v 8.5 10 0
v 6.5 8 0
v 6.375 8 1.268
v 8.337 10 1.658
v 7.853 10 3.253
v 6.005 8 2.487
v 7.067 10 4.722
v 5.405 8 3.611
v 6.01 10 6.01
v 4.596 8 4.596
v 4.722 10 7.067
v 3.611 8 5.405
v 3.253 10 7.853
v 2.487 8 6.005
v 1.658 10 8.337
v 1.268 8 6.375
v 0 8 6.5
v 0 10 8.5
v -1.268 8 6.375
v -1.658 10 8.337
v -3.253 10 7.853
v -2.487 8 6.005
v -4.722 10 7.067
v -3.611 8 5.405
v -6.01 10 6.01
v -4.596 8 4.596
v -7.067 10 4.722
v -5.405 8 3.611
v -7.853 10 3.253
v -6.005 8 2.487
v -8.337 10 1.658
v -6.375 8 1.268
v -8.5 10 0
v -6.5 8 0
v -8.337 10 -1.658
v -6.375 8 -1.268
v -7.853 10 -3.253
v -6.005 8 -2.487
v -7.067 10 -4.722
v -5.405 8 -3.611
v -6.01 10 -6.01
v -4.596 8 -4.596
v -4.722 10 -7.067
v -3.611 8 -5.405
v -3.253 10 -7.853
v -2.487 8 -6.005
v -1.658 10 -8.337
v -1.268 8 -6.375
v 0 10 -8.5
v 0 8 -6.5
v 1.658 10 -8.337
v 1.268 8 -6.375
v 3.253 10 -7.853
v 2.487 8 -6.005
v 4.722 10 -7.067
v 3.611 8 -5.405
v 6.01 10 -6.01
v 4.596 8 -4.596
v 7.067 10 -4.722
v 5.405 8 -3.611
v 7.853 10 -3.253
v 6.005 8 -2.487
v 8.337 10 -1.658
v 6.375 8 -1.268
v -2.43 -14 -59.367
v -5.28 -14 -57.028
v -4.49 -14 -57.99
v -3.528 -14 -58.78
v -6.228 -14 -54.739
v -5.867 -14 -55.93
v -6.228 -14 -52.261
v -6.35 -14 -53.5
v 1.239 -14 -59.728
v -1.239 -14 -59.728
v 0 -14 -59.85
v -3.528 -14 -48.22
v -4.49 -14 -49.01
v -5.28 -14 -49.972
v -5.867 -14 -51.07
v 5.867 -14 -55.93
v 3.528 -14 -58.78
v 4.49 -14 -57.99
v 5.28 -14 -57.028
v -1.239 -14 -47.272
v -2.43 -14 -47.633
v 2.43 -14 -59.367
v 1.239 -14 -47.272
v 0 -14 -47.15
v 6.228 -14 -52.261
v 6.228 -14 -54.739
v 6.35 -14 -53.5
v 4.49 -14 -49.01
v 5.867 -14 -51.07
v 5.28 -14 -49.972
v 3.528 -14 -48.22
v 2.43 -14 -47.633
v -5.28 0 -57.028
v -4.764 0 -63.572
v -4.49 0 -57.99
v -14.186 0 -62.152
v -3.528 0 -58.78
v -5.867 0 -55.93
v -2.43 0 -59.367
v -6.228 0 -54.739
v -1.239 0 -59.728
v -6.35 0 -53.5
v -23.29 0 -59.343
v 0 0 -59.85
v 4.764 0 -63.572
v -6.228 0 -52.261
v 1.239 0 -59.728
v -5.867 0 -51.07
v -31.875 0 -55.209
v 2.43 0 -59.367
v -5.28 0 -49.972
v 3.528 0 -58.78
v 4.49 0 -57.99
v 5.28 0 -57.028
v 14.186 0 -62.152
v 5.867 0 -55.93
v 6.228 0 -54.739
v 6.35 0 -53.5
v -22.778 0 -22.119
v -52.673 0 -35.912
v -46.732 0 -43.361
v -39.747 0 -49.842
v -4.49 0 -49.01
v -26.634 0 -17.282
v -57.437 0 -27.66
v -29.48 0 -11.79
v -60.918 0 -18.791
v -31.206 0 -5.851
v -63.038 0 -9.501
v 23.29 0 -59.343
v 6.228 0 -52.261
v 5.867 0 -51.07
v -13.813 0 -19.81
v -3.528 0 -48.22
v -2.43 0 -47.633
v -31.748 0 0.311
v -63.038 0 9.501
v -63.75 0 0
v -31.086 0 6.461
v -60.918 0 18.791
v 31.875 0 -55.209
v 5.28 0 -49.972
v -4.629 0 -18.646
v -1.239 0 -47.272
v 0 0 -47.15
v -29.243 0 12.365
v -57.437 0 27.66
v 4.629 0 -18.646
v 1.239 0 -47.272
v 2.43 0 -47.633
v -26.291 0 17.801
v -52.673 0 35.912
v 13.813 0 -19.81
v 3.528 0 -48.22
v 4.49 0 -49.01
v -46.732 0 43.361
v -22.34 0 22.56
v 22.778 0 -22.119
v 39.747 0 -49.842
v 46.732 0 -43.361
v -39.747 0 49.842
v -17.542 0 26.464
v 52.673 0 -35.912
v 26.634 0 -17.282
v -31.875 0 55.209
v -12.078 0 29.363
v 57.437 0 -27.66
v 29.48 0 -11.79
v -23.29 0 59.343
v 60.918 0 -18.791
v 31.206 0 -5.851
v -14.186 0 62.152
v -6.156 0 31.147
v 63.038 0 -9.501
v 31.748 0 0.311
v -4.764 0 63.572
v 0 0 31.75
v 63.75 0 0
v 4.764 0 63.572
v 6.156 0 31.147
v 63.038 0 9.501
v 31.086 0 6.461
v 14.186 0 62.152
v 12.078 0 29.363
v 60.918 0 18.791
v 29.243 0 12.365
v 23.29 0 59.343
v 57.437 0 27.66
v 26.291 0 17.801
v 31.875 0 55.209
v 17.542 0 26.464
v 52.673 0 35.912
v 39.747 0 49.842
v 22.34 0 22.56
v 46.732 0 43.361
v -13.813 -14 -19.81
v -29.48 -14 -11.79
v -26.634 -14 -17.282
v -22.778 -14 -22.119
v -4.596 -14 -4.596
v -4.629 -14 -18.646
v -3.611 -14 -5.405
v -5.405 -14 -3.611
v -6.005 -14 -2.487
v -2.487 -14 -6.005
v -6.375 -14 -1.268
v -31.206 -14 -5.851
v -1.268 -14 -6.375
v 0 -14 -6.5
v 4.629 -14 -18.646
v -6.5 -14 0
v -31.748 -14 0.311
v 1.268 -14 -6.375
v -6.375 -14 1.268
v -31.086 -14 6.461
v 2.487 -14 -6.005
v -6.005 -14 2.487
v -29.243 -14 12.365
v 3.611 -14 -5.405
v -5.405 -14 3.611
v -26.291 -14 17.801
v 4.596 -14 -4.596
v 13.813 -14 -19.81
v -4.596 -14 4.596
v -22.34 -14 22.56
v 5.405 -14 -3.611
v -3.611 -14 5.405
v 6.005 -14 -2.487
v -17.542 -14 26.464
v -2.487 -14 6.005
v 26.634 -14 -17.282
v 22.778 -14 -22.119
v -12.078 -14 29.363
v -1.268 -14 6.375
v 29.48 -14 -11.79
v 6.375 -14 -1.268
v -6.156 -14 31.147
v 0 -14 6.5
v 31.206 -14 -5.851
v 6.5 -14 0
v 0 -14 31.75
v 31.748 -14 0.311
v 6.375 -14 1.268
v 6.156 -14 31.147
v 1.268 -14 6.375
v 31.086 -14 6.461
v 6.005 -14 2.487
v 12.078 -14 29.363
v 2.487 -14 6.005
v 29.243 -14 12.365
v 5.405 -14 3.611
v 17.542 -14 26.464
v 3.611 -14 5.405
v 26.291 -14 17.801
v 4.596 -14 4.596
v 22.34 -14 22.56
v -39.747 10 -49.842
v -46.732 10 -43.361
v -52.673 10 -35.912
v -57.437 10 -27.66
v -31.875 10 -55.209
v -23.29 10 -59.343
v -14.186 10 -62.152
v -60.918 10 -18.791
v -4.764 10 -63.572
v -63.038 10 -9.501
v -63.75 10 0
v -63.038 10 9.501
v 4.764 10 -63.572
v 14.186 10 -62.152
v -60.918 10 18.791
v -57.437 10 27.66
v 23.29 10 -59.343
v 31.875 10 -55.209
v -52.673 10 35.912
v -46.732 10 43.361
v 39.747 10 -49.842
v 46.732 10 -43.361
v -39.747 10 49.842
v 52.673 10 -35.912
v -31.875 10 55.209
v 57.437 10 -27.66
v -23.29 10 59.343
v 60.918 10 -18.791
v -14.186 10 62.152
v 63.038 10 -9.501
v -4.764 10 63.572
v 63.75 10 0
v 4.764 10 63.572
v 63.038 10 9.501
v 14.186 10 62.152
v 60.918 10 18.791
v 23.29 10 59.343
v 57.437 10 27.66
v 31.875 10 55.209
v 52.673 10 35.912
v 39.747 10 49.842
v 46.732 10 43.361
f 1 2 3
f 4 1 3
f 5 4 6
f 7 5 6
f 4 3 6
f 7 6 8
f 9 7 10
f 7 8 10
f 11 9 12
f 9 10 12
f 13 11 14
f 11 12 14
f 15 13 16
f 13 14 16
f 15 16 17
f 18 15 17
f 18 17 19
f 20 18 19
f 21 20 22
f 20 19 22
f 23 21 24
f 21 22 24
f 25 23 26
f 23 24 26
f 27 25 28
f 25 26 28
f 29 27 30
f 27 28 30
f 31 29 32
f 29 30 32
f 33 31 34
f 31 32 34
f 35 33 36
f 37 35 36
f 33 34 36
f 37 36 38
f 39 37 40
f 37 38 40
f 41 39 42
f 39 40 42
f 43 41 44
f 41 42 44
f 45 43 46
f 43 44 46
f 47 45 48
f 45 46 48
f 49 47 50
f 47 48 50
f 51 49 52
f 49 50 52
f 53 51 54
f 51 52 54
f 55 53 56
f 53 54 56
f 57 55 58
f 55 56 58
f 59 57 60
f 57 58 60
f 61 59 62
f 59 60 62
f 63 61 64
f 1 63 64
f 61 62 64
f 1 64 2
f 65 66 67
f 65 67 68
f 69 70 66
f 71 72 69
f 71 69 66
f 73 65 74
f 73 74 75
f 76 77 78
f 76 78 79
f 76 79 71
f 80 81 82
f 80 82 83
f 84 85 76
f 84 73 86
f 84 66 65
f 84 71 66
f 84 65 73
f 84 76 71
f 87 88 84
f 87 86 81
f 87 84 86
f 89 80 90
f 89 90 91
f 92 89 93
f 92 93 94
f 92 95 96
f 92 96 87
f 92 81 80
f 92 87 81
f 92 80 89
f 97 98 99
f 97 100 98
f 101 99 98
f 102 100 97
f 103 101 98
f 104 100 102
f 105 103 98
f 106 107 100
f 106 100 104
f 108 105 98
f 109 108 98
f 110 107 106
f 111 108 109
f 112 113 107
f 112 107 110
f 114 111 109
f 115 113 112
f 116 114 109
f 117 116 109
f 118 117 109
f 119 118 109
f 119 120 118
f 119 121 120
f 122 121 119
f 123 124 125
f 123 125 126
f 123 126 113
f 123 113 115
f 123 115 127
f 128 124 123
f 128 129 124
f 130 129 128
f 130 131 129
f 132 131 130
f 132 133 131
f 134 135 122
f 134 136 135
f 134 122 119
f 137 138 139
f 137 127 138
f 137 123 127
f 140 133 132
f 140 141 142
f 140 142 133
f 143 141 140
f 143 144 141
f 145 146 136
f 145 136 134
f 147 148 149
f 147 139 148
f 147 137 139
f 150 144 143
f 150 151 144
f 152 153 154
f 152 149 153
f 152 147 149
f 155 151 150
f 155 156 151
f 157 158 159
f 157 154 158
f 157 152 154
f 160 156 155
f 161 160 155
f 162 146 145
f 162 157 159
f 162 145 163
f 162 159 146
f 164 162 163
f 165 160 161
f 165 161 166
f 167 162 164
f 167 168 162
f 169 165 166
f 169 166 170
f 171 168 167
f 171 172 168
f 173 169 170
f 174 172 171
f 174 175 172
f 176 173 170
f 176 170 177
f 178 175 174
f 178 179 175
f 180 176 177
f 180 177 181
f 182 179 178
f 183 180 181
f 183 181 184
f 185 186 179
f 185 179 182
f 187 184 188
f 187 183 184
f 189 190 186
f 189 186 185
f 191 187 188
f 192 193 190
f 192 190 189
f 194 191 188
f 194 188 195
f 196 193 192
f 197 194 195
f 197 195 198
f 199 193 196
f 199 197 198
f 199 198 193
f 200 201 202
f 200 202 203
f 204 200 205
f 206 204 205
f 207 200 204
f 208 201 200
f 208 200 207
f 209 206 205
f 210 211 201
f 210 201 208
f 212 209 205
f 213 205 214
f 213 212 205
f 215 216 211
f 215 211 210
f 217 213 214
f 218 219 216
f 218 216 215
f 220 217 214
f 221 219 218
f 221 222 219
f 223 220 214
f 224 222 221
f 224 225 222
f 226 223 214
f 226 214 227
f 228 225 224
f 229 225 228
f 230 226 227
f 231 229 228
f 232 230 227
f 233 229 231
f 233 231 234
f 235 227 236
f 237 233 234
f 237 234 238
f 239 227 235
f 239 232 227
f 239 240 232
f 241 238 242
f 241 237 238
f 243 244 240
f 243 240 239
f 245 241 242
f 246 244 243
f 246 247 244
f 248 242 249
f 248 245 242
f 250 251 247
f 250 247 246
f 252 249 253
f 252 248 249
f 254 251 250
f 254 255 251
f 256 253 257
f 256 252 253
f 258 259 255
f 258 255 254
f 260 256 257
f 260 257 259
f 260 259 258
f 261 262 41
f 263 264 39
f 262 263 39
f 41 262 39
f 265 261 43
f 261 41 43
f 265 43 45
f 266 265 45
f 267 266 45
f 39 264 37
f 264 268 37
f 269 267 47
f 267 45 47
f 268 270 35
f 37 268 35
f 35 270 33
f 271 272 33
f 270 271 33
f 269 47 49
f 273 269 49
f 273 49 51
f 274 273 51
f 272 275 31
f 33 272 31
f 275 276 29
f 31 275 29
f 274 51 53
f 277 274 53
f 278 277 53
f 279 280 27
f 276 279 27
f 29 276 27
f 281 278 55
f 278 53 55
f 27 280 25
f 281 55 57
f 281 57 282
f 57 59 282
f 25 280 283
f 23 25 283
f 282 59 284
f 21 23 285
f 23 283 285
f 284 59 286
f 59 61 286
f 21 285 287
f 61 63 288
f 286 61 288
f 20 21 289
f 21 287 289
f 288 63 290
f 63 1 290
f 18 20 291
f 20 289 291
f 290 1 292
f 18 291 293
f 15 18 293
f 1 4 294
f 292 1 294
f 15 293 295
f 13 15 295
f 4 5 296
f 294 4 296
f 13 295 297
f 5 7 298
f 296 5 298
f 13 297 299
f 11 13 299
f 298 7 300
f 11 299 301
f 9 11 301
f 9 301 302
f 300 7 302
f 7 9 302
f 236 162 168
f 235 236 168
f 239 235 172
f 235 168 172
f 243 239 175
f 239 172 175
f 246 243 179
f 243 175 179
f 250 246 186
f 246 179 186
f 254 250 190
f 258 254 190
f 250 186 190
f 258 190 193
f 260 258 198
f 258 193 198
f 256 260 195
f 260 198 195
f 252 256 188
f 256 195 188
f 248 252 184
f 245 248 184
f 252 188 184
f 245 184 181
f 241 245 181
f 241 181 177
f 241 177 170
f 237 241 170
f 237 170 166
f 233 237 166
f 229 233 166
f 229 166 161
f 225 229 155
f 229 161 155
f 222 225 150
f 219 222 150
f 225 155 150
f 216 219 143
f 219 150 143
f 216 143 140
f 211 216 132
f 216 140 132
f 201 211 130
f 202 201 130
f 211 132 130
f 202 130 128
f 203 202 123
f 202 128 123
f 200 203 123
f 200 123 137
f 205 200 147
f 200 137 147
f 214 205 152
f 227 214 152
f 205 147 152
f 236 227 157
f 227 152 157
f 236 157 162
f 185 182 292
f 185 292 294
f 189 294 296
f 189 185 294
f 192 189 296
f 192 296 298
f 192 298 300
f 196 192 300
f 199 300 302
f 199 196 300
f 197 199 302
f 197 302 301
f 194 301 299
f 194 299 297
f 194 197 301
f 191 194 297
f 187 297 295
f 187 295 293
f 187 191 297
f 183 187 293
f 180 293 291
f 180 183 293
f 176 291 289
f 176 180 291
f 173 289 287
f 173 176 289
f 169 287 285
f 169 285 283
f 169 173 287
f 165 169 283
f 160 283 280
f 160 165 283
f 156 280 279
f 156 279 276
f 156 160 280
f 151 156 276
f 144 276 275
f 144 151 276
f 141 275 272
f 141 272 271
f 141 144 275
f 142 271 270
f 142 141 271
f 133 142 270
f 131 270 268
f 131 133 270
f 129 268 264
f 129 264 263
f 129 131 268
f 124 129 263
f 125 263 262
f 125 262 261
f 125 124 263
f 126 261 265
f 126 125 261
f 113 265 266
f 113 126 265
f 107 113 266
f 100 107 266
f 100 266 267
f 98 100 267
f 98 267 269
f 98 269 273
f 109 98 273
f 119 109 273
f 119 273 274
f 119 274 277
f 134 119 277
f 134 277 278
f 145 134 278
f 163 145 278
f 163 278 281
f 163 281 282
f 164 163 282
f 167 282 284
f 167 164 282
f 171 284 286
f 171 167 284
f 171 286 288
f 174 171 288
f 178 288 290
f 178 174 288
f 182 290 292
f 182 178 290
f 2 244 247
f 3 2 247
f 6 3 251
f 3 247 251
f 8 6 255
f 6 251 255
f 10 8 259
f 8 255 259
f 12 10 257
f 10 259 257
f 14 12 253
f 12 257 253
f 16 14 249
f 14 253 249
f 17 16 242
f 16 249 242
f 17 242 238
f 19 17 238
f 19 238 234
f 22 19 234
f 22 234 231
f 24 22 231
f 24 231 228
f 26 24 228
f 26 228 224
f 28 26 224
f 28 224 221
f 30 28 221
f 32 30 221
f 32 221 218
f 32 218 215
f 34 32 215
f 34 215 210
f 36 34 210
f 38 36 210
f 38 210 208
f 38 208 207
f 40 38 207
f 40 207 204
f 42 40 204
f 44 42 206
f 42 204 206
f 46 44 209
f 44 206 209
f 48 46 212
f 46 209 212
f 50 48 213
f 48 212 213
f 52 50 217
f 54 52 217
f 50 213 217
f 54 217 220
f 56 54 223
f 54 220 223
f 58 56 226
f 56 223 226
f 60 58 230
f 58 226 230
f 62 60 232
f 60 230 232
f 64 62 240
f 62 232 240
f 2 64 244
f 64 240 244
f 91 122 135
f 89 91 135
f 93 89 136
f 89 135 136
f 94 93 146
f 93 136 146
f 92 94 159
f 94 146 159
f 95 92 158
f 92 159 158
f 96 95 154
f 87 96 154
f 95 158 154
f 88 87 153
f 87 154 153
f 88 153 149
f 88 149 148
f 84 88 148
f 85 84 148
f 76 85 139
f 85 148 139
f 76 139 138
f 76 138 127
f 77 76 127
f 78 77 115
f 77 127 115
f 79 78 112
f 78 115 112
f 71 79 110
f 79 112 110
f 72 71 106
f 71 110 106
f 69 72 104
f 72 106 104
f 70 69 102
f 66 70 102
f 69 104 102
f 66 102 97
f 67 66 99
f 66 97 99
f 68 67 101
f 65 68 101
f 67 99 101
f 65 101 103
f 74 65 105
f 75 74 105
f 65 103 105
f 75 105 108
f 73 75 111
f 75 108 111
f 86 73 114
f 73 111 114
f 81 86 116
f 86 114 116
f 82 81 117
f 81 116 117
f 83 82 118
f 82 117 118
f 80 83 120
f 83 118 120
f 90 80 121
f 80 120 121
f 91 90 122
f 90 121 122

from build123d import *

# Parameters (mm, degrees)
F1_R          = 63.75
F2_DEPTH      = 10
F3_R          = 6.35
F4_DEPTH      = 14
F5_R          = 6.5
F6_DEPTH      = 10.001
F6_DEPTH_BACK = 14.001
F7_SIZE       = 2


with BuildPart() as f2:
    # F1 (on Front) → F2 (new body)
    with BuildSketch(Plane.XZ):
        Circle(F1_R)
    extrude(amount=-F2_DEPTH)

    # F3 (on Front) → F4 (join)
    with BuildSketch(Plane.XZ):
        with BuildLine():
            ThreePointArc((-22.7778931025, -22.1185461957), (0, -18.5), (22.7778931025, -22.1185461957))
            ThreePointArc((22.7778931025, -22.1185461957), (0, 31.75), (-22.7778931025, -22.1185461957))
        make_face()
        with Locations((0, -53.5)):
            Circle(F3_R)
    extrude(amount=F4_DEPTH)

    # F5 (on Front) → F6 (cut, two sides)
    with BuildSketch(Plane.XZ) as f6_sk:
        Circle(F5_R)
    extrude(amount=-F6_DEPTH, mode=Mode.SUBTRACT)
    extrude(f6_sk.sketch, amount=F6_DEPTH_BACK, mode=Mode.SUBTRACT)

    # F7
    f7_edges = [f2.edges().sort_by_distance(p)[0] for p in [
        (-6.5, 10, 0),
    ]]
    chamfer(f7_edges, length=F7_SIZE)


solid = f2.part
